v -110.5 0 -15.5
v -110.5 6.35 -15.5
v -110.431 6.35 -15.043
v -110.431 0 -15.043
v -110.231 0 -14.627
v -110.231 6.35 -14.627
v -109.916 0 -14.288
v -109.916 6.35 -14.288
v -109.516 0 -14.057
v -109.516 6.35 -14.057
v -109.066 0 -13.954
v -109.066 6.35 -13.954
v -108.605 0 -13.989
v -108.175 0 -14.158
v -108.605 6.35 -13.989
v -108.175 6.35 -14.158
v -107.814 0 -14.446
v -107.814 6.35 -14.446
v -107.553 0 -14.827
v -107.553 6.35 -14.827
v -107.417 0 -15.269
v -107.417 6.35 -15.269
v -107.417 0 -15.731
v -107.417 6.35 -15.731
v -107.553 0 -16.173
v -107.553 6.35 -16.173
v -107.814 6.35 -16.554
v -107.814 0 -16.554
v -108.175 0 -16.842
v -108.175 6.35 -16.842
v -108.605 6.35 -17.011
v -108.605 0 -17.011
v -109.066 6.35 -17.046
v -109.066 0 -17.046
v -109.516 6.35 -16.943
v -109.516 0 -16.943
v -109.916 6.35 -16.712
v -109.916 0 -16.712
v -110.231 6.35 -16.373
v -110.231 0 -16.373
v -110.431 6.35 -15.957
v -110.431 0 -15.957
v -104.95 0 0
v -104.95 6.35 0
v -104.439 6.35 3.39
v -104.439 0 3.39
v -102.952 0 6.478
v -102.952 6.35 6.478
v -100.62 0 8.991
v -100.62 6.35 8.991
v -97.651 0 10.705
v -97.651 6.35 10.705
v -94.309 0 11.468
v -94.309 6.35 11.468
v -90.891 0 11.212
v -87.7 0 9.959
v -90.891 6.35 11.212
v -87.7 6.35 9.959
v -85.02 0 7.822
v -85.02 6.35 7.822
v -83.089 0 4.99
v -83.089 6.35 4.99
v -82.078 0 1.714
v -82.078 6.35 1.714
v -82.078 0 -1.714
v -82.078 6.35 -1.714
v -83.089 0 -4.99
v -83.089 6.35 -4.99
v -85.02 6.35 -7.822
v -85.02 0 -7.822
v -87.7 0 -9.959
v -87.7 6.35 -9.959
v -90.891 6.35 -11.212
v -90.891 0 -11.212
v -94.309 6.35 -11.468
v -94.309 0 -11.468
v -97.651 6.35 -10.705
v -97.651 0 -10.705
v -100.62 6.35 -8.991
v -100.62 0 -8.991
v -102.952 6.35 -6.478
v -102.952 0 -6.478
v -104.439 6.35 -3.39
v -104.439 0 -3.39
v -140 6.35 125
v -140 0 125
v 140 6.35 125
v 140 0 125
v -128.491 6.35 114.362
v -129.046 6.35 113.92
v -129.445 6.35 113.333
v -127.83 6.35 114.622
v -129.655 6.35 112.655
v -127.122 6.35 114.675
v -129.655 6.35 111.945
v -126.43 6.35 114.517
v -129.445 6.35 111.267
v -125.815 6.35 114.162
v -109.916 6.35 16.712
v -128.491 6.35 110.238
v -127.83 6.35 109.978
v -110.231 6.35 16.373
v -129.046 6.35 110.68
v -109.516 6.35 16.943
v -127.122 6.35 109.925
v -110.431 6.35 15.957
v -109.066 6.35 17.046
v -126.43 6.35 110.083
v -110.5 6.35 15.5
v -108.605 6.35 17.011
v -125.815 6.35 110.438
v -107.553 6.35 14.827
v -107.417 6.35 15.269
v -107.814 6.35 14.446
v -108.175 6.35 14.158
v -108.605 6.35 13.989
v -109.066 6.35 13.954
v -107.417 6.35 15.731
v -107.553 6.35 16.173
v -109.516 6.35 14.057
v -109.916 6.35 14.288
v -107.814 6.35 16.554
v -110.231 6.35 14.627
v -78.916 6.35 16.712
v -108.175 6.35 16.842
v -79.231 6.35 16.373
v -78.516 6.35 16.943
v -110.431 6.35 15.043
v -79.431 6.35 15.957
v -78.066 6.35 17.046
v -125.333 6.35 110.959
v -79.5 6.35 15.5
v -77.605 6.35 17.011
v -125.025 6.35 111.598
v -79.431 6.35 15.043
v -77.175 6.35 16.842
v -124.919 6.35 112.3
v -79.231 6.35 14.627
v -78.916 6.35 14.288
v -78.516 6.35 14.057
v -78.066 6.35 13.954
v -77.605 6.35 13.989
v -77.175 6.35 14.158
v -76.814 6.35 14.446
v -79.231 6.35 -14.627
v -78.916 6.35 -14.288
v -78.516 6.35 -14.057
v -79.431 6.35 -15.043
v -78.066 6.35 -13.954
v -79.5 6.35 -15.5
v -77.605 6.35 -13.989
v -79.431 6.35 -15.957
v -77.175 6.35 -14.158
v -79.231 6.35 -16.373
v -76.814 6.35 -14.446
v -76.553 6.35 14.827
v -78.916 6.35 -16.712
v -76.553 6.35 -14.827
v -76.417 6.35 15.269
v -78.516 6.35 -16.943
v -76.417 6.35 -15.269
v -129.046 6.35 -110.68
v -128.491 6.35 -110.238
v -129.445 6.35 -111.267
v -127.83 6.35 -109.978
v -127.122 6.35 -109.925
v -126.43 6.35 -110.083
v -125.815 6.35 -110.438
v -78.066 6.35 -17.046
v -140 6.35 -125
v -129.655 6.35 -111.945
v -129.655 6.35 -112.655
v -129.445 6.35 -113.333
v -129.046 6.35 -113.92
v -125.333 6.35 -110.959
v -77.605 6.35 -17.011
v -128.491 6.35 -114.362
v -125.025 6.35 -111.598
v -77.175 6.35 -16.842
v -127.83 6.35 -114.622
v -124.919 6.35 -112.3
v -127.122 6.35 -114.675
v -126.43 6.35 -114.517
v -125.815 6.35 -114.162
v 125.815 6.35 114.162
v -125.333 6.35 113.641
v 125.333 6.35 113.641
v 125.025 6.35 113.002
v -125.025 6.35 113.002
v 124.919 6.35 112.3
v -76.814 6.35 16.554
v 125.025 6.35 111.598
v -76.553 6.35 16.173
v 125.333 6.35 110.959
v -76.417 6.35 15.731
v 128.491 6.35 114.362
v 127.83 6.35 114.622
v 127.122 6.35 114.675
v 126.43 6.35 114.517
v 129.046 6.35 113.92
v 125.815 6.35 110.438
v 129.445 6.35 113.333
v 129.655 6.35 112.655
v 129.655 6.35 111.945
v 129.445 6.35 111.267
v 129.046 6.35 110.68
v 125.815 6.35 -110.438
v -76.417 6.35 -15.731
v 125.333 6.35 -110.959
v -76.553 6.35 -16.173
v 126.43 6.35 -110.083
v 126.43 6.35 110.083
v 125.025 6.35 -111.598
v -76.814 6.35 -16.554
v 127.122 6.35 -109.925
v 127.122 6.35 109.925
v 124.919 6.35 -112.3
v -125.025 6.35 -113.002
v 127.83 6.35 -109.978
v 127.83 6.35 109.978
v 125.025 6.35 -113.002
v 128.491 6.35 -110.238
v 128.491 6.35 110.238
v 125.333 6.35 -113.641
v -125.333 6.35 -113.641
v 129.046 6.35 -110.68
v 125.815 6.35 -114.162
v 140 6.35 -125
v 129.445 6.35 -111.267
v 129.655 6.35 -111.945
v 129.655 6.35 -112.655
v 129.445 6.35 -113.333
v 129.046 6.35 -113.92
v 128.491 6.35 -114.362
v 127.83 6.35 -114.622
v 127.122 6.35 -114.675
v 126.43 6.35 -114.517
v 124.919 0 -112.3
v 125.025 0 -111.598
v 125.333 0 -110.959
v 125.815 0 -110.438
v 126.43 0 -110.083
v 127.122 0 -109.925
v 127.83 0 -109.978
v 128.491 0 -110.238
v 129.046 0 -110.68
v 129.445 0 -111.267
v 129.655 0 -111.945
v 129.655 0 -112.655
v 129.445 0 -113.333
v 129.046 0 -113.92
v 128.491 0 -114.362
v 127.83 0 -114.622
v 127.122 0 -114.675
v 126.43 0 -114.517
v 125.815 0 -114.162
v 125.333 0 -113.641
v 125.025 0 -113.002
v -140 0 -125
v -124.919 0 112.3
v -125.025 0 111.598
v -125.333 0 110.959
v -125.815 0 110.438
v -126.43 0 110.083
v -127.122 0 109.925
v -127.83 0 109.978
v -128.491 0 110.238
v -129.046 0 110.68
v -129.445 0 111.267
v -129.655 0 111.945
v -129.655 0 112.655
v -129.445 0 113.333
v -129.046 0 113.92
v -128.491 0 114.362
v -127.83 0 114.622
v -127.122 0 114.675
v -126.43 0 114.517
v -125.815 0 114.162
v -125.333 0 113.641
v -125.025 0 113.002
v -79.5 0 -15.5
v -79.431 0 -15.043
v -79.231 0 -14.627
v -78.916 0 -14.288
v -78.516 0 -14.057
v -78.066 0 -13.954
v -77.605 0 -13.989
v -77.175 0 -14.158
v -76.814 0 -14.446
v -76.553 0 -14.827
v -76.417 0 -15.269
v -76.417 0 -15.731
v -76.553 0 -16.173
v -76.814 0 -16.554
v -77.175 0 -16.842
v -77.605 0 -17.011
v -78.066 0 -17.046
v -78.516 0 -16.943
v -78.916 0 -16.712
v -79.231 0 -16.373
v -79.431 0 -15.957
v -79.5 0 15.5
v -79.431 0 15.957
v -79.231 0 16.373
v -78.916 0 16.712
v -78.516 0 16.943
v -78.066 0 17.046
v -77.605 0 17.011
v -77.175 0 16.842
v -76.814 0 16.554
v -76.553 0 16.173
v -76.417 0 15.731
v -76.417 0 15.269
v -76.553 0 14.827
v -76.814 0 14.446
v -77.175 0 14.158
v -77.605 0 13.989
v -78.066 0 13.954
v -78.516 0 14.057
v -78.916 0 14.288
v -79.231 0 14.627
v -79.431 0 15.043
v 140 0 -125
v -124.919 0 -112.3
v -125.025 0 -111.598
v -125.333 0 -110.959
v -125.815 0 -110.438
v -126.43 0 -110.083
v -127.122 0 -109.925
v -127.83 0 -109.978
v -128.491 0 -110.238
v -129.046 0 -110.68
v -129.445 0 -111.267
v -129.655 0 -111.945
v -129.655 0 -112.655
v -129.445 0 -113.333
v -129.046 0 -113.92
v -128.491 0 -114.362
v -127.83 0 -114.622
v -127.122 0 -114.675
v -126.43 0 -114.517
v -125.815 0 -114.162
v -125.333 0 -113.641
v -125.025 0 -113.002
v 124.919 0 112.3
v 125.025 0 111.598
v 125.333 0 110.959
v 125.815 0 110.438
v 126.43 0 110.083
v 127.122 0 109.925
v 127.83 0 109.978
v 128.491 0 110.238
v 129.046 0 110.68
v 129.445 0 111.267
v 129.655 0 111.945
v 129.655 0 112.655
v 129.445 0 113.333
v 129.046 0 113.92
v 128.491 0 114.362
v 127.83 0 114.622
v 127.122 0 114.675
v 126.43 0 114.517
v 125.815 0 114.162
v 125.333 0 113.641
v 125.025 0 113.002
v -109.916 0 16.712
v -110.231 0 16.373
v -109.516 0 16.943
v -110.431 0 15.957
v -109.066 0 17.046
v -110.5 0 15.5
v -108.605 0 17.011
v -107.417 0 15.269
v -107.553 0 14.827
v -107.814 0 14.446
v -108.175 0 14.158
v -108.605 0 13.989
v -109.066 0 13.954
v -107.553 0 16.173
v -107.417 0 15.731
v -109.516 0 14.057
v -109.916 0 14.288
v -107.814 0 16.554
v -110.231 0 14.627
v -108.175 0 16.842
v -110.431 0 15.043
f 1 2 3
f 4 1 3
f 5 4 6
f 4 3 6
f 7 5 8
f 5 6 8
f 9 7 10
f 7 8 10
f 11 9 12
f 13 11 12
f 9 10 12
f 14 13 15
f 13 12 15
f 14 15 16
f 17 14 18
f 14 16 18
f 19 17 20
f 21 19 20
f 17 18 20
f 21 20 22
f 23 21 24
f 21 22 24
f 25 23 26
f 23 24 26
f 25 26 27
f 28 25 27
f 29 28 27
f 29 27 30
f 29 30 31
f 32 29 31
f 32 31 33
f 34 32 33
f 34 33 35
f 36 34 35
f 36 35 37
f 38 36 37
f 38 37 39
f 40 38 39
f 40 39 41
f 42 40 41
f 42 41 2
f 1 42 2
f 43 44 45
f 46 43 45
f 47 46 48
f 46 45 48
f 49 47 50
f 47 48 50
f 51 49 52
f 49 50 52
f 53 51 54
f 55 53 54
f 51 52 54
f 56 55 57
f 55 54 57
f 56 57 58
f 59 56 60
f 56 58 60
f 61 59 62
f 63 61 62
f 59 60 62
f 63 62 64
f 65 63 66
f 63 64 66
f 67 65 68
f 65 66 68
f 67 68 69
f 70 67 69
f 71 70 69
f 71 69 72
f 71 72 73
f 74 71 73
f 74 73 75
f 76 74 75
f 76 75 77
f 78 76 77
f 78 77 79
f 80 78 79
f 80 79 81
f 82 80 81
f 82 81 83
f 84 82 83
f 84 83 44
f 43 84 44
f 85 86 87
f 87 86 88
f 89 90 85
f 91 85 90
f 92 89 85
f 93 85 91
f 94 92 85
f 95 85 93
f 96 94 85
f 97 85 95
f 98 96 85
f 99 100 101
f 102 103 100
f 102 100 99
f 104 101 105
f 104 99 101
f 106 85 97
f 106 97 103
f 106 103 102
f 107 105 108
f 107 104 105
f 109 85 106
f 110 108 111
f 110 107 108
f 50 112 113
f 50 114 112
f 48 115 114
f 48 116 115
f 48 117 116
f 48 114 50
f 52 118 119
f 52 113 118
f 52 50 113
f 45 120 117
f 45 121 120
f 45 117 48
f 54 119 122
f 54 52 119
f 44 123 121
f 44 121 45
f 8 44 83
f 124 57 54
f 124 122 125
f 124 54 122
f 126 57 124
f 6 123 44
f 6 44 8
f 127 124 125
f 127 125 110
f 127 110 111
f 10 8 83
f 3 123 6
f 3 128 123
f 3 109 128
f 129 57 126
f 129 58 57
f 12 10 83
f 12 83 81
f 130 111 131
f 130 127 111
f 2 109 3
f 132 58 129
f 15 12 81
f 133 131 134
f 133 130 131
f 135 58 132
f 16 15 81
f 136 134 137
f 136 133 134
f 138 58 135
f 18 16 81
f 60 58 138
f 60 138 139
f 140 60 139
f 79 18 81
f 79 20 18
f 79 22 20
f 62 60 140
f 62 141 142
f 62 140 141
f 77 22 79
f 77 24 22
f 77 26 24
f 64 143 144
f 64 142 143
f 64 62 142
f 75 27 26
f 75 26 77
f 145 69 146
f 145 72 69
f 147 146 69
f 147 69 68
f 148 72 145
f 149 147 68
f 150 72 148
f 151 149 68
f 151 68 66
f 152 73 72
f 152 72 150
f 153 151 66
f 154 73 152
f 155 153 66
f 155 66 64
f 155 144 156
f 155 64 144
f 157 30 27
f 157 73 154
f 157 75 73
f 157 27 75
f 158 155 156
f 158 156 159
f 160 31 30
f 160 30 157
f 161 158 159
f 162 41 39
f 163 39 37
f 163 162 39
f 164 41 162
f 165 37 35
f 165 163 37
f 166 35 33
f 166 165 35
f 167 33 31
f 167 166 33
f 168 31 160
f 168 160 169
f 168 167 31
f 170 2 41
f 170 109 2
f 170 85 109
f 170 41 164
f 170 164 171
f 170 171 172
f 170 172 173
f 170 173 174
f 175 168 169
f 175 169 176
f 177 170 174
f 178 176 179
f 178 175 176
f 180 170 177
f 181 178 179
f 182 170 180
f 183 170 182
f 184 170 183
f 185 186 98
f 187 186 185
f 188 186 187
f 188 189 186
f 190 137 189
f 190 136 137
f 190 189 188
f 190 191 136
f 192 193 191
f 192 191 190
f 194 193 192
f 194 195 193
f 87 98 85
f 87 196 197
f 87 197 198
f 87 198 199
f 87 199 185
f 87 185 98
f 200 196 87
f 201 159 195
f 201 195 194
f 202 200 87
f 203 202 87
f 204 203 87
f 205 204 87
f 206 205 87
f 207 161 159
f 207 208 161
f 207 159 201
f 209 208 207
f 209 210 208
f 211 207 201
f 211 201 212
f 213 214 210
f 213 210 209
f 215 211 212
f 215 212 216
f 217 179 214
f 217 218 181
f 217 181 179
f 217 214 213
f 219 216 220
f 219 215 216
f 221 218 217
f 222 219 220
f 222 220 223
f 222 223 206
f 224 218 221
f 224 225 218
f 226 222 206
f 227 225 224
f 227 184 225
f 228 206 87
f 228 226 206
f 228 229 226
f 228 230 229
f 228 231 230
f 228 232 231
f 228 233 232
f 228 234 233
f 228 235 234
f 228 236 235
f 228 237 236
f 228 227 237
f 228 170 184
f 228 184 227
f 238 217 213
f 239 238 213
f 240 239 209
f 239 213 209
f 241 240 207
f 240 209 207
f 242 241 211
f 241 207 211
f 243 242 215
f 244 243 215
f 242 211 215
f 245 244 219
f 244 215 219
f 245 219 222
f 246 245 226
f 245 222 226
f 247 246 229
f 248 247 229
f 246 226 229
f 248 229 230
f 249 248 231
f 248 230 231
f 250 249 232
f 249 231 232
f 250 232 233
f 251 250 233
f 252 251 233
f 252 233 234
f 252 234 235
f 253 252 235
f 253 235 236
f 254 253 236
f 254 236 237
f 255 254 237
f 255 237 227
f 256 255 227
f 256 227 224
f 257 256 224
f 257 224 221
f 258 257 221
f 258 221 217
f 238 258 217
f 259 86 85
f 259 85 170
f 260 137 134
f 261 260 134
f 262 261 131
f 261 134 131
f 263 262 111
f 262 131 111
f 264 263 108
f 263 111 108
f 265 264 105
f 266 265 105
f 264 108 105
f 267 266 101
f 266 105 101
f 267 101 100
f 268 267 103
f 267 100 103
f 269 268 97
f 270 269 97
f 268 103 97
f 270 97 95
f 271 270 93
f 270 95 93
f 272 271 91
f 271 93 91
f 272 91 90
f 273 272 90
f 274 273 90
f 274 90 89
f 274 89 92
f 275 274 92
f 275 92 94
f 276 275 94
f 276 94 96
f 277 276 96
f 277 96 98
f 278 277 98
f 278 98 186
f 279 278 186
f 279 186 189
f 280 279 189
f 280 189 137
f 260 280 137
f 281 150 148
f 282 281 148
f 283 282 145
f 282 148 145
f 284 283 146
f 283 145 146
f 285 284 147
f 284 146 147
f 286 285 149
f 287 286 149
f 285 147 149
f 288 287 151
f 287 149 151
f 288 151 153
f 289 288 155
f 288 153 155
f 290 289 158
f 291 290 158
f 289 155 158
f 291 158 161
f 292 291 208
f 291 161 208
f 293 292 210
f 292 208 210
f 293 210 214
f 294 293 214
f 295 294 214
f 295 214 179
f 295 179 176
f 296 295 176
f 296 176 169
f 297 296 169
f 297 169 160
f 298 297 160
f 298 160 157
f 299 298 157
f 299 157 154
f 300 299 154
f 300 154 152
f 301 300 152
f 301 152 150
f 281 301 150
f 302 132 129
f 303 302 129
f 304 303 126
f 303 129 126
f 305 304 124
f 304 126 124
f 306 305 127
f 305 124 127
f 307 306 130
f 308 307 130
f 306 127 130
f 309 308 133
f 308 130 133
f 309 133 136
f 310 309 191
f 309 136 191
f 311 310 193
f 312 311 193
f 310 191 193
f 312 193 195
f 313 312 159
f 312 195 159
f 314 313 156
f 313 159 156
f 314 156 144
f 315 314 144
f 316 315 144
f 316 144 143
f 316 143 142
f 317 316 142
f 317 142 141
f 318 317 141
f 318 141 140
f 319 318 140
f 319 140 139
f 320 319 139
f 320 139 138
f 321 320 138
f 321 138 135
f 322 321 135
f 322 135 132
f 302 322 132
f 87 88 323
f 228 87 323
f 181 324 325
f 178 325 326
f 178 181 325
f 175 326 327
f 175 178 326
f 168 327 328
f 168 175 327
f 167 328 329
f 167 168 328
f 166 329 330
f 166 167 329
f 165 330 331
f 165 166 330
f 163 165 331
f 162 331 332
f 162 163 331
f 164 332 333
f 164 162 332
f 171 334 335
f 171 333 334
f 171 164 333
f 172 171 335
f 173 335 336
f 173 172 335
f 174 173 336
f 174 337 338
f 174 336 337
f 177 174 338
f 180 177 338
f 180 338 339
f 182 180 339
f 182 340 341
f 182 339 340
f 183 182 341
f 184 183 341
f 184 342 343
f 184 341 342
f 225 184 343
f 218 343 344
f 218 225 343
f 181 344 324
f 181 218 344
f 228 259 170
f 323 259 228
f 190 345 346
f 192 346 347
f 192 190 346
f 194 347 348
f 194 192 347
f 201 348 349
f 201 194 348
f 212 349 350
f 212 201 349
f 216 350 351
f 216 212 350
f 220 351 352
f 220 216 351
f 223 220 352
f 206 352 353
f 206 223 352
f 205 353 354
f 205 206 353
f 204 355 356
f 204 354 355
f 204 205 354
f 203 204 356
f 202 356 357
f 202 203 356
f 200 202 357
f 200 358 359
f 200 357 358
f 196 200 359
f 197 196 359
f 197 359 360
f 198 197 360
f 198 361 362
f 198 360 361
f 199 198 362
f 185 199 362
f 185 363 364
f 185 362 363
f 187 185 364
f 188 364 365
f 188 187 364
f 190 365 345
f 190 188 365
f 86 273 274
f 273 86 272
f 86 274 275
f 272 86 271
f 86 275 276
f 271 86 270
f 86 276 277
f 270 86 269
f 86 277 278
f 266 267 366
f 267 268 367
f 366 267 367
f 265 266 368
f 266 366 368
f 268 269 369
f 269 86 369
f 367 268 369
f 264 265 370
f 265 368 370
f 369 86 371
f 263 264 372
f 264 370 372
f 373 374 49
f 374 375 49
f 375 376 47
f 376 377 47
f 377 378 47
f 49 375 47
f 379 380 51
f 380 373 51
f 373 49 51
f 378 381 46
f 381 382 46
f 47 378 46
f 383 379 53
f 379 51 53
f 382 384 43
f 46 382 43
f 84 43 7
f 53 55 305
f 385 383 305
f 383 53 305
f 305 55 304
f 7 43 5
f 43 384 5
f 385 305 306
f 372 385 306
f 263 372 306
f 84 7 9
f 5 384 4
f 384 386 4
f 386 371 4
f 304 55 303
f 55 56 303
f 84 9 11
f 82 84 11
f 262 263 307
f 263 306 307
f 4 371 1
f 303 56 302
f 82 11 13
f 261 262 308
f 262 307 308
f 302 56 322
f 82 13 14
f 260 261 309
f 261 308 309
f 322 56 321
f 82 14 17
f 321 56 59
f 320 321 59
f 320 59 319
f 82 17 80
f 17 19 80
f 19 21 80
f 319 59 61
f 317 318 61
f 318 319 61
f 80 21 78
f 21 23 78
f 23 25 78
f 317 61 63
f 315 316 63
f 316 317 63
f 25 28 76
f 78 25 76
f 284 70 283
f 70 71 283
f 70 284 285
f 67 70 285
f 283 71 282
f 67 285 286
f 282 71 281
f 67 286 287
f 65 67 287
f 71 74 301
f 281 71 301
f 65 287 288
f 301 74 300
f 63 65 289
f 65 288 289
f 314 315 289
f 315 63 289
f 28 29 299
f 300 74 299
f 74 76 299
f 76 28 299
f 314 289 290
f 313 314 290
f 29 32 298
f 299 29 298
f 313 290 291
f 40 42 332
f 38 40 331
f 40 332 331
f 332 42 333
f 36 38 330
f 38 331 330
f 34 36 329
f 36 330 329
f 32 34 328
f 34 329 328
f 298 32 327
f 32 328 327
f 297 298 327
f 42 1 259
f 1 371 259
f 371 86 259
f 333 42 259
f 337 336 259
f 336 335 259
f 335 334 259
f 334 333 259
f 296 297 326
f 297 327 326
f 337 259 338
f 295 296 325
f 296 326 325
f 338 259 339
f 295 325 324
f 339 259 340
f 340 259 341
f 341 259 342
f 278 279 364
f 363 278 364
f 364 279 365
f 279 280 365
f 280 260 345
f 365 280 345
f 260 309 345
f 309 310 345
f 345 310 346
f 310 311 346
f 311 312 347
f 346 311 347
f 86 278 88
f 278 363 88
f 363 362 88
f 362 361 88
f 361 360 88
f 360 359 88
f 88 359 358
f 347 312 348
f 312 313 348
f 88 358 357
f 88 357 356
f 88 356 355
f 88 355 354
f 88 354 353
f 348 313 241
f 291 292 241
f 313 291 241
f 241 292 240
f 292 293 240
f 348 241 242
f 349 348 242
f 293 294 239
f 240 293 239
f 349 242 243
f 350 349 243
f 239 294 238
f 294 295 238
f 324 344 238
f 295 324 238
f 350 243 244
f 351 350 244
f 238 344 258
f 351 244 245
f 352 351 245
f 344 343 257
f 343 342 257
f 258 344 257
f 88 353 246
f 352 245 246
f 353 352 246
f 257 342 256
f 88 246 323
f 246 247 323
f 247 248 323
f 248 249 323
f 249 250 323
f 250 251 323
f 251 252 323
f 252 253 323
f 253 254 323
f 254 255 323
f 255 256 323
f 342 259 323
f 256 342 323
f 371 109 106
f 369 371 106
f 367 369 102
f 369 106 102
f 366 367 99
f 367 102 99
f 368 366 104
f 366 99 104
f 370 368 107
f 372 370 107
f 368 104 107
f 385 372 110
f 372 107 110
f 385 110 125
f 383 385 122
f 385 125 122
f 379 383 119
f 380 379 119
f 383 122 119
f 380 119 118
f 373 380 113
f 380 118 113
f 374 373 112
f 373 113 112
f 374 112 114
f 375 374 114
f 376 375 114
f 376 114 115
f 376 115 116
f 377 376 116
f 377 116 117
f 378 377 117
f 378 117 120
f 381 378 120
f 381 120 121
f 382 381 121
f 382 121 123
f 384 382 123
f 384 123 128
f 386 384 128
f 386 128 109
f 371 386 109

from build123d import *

# Parameters (mm, degrees)
SKETCH1_W               = 280
SKETCH1_H               = 250
BOSS_EXTRUDE1_DEPTH     = 6.35
SKETCH3_R               = 2.38125
CUT_EXTRUDE1_DEPTH      = 7.35
MIRROR2_COPY_1_SKETCH_R = 2.38125
MIRROR2_COPY_1_DEPTH    = 7.35
SKETCH7_R               = 1.55
SKETCH7_R_2             = 11.5
CUT_EXTRUDE4_DEPTH      = 7.35


with BuildPart() as part:
    # Sketch1 → Boss-Extrude1 (new body)
    with BuildSketch(Plane(origin=(0, 0, 0), x_dir=(1, 0, 0), z_dir=(0, 1, 0))):
        Rectangle(SKETCH1_W, SKETCH1_H)
    extrude(amount=BOSS_EXTRUDE1_DEPTH)

    # Sketch3 → Cut-Extrude1 (cut, through all)
    with BuildSketch(Plane(origin=(0, 6.35, 0), x_dir=(1, 0, 0), z_dir=(0, 1, 0))):
        with Locations((-127.3, -112.3)):
            Circle(SKETCH3_R)
    cut_extrude1 = extrude(amount=-CUT_EXTRUDE1_DEPTH, mode=Mode.SUBTRACT)

    # Mirror1: Cut-Extrude1 across plane
    add(cut_extrude1.mirror(Plane.XY), mode=Mode.SUBTRACT)

    # Mirror2: Cut-Extrude1 across plane
    add(cut_extrude1.mirror(Plane(origin=(0, 0, 0), x_dir=(0, 0, 1), z_dir=(1, 0, 0))), mode=Mode.SUBTRACT)

    # Mirror2 copy 1 sketch → Mirror2 copy 1 (cut, through all)
    with BuildSketch(Plane(origin=(0, 6.35, 0), x_dir=(-1, 0, 0), z_dir=(0, 1, 0))):
        with Locations((-127.3, -112.3)):
            Circle(MIRROR2_COPY_1_SKETCH_R)
    extrude(amount=-MIRROR2_COPY_1_DEPTH, mode=Mode.SUBTRACT)

    # Sketch7 → Cut-Extrude4 (cut, through all)
    with BuildSketch(Plane(origin=(0, 6.35, 0), x_dir=(-1, 0, 0), z_dir=(0, 1, 0))):
        with Locations((77.95, 15.5)):
            Circle(SKETCH7_R)
        with Locations((93.45, 0)):
            Circle(SKETCH7_R_2)
        with Locations((108.95, 15.5)):
            Circle(SKETCH7_R)
        with Locations((108.95, -15.5)):
            Circle(SKETCH7_R)
        with Locations((77.95, -15.5)):
            Circle(SKETCH7_R)
    extrude(amount=-CUT_EXTRUDE4_DEPTH, mode=Mode.SUBTRACT)


solid = part.part
